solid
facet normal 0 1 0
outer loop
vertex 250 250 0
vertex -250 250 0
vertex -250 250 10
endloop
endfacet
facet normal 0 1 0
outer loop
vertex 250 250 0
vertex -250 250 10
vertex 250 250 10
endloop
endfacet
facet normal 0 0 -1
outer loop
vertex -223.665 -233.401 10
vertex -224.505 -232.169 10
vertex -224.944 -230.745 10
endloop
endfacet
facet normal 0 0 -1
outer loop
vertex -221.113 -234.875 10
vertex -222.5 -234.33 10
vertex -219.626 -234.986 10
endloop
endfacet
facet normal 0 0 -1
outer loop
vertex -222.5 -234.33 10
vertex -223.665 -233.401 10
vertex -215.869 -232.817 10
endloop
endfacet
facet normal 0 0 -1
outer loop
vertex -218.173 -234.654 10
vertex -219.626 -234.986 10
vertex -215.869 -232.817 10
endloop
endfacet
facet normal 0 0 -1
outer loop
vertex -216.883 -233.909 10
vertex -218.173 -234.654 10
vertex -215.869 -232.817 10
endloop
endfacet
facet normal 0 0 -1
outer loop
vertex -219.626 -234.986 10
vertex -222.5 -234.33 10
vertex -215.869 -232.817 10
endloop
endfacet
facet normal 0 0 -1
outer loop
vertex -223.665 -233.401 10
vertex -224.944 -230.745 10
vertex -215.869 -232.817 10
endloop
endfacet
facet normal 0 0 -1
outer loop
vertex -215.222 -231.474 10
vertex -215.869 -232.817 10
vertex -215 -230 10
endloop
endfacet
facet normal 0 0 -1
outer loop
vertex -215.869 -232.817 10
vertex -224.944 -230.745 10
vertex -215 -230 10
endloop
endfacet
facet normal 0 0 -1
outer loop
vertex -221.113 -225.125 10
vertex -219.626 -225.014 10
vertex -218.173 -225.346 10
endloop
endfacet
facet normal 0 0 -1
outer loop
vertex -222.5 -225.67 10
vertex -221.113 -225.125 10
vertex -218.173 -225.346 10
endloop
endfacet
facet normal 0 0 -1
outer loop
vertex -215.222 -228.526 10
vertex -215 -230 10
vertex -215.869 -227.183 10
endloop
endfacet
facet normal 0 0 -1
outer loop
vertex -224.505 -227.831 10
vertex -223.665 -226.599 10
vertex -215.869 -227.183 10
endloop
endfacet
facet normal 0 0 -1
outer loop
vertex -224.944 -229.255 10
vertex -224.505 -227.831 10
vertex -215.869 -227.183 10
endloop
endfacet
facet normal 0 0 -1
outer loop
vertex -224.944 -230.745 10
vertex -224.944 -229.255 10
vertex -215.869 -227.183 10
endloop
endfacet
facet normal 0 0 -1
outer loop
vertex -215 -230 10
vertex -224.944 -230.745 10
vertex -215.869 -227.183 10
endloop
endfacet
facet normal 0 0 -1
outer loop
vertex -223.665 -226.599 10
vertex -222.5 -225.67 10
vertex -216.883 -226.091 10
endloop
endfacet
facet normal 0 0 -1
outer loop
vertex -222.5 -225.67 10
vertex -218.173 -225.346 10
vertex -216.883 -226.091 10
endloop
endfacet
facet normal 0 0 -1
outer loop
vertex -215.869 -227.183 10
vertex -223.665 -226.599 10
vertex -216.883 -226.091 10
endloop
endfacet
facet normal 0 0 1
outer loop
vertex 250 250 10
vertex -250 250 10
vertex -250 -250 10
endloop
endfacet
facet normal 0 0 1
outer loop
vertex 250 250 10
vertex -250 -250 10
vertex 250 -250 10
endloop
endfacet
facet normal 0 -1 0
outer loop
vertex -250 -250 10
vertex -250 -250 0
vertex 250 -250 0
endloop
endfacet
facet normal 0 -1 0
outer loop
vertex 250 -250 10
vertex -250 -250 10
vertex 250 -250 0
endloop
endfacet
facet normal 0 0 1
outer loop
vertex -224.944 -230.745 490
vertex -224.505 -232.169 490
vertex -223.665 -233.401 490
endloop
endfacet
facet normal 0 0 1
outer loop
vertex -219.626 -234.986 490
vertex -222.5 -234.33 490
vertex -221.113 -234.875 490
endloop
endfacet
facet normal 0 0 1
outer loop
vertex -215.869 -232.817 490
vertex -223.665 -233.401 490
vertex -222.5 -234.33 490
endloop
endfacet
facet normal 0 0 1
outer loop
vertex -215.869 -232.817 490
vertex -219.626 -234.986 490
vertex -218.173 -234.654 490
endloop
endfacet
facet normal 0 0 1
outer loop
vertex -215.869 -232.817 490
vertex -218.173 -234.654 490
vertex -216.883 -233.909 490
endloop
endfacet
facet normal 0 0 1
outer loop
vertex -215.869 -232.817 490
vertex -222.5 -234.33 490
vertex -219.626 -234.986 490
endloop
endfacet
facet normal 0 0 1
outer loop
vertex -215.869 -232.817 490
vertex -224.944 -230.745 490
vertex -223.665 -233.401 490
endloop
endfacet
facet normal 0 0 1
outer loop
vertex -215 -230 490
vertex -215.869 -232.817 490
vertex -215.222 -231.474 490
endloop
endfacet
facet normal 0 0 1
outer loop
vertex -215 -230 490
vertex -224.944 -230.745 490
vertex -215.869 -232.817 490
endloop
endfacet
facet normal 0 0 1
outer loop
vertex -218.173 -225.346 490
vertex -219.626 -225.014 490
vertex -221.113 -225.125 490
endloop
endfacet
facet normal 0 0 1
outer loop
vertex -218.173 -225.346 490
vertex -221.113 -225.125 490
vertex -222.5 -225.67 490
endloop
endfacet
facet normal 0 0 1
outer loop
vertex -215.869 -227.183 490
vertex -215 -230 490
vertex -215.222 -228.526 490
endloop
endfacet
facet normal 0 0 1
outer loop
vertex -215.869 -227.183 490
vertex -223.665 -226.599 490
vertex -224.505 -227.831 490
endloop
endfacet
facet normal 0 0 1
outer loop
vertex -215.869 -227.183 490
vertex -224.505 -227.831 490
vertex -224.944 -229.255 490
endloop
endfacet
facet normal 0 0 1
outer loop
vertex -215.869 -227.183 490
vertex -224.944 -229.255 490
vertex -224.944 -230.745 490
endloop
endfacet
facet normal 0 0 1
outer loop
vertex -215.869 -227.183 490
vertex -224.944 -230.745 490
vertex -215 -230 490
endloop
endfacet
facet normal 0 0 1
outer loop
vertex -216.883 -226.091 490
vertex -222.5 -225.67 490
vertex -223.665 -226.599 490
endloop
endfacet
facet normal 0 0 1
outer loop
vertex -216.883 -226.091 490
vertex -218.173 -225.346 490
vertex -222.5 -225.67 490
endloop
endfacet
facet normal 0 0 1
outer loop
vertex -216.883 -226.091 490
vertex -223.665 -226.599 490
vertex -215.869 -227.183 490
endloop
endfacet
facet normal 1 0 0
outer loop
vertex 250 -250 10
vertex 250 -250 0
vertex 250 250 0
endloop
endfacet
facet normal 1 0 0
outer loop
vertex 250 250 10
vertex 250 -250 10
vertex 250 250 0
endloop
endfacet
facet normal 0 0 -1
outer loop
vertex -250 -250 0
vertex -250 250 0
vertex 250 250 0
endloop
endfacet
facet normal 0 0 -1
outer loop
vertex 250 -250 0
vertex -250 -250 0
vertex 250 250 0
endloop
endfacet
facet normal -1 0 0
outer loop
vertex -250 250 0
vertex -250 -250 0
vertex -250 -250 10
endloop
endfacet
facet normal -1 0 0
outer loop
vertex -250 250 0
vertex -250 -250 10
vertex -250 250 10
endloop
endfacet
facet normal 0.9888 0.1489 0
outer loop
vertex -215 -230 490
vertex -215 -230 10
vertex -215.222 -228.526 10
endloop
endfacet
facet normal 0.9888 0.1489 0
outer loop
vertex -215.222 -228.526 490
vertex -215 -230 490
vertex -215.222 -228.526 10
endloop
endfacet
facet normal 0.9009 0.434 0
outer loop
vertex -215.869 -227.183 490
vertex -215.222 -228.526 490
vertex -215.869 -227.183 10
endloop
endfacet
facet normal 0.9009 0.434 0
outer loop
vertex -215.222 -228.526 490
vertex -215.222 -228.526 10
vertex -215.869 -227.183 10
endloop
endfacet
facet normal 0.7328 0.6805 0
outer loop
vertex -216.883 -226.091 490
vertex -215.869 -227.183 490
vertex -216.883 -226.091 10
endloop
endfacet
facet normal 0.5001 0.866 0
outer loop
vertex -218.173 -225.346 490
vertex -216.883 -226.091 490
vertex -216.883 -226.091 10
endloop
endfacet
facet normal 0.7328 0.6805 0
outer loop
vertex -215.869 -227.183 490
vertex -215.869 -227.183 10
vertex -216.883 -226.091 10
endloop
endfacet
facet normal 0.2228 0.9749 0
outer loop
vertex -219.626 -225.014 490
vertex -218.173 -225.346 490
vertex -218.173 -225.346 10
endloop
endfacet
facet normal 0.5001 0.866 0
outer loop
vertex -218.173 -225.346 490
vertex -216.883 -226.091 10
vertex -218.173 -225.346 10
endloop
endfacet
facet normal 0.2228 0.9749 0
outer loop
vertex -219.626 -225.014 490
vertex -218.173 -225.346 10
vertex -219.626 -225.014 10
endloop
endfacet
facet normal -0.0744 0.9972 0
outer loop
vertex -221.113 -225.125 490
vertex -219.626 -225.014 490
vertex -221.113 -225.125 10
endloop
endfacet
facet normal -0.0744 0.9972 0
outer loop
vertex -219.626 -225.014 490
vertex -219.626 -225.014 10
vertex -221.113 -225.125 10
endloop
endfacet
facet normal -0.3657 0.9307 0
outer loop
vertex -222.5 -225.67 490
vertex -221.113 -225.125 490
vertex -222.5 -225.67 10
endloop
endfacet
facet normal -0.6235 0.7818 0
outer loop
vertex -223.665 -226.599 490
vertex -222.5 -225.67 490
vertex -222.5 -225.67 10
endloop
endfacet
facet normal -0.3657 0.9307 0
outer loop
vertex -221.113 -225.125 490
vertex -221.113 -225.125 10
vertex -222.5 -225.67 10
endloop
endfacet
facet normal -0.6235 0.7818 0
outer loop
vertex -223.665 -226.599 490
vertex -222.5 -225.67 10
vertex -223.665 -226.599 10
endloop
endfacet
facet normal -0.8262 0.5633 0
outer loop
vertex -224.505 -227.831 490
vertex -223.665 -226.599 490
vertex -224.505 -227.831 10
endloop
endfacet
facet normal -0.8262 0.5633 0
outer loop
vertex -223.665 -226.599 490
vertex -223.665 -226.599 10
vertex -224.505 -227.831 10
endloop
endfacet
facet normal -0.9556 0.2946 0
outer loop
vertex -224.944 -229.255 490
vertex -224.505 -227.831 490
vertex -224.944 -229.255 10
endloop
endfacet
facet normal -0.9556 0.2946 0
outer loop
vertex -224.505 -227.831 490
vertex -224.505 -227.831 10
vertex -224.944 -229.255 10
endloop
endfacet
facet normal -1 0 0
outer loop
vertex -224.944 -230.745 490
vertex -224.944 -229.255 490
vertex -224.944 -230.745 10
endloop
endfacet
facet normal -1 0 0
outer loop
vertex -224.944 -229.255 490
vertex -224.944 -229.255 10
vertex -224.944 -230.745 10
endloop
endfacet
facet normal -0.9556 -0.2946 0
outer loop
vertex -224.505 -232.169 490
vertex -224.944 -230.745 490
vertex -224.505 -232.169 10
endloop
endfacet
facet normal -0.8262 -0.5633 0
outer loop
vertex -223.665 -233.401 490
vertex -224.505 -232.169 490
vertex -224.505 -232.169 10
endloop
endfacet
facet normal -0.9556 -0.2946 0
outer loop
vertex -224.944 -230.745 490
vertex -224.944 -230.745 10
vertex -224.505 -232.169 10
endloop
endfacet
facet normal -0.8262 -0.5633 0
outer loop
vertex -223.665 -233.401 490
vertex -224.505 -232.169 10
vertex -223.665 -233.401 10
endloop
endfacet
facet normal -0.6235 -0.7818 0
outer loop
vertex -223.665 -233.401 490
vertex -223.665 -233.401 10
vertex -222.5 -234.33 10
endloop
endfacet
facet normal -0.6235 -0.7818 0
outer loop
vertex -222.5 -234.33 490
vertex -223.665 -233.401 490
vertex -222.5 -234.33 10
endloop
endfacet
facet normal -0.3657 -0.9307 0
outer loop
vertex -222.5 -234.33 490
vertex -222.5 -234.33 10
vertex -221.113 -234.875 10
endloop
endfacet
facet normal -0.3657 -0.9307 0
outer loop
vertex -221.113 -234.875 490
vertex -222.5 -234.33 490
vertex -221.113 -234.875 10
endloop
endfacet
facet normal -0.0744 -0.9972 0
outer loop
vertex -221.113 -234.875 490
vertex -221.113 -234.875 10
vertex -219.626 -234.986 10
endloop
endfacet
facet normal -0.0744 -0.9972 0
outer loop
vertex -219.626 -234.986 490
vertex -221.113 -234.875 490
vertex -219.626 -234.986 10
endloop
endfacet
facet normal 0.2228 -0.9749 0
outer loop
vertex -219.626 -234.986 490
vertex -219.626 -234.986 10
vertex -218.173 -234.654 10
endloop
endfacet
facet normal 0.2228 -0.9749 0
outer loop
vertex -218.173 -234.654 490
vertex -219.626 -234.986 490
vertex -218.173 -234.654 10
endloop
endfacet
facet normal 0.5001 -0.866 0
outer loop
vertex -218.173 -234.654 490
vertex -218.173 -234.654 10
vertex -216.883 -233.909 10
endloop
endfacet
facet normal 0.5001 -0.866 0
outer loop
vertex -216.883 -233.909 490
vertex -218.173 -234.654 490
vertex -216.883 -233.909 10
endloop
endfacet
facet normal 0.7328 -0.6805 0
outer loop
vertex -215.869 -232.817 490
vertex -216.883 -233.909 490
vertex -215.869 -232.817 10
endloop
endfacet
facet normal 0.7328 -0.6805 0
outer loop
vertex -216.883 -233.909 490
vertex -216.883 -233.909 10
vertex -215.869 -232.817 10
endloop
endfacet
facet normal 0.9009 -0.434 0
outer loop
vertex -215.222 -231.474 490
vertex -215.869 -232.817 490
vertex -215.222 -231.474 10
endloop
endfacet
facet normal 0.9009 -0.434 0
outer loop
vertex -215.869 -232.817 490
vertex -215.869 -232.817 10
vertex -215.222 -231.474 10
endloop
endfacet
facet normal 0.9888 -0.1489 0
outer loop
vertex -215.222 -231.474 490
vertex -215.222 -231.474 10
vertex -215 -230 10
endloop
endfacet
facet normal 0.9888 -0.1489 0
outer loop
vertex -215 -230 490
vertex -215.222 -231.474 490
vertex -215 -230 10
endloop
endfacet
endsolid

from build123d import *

# Parameters (mm, degrees)
F0_W     = 500
F0_H     = 500
F1_DEPTH = 10
F2_R     = 5
F3_DEPTH = 480


with BuildPart() as f1:
    # F0 (on Top) → F1 (new body)
    with BuildSketch(Plane.XY):
        Rectangle(F0_W, F0_H)
    extrude(amount=F1_DEPTH)


with BuildPart() as f3:
    # F2 (on face) → F3 (new body)
    with BuildSketch(Plane.XY.offset(10)):
        with Locations((-220, -230)):
            Circle(F2_R)
    extrude(amount=F3_DEPTH)


solid = Compound([f1.part, f3.part])
